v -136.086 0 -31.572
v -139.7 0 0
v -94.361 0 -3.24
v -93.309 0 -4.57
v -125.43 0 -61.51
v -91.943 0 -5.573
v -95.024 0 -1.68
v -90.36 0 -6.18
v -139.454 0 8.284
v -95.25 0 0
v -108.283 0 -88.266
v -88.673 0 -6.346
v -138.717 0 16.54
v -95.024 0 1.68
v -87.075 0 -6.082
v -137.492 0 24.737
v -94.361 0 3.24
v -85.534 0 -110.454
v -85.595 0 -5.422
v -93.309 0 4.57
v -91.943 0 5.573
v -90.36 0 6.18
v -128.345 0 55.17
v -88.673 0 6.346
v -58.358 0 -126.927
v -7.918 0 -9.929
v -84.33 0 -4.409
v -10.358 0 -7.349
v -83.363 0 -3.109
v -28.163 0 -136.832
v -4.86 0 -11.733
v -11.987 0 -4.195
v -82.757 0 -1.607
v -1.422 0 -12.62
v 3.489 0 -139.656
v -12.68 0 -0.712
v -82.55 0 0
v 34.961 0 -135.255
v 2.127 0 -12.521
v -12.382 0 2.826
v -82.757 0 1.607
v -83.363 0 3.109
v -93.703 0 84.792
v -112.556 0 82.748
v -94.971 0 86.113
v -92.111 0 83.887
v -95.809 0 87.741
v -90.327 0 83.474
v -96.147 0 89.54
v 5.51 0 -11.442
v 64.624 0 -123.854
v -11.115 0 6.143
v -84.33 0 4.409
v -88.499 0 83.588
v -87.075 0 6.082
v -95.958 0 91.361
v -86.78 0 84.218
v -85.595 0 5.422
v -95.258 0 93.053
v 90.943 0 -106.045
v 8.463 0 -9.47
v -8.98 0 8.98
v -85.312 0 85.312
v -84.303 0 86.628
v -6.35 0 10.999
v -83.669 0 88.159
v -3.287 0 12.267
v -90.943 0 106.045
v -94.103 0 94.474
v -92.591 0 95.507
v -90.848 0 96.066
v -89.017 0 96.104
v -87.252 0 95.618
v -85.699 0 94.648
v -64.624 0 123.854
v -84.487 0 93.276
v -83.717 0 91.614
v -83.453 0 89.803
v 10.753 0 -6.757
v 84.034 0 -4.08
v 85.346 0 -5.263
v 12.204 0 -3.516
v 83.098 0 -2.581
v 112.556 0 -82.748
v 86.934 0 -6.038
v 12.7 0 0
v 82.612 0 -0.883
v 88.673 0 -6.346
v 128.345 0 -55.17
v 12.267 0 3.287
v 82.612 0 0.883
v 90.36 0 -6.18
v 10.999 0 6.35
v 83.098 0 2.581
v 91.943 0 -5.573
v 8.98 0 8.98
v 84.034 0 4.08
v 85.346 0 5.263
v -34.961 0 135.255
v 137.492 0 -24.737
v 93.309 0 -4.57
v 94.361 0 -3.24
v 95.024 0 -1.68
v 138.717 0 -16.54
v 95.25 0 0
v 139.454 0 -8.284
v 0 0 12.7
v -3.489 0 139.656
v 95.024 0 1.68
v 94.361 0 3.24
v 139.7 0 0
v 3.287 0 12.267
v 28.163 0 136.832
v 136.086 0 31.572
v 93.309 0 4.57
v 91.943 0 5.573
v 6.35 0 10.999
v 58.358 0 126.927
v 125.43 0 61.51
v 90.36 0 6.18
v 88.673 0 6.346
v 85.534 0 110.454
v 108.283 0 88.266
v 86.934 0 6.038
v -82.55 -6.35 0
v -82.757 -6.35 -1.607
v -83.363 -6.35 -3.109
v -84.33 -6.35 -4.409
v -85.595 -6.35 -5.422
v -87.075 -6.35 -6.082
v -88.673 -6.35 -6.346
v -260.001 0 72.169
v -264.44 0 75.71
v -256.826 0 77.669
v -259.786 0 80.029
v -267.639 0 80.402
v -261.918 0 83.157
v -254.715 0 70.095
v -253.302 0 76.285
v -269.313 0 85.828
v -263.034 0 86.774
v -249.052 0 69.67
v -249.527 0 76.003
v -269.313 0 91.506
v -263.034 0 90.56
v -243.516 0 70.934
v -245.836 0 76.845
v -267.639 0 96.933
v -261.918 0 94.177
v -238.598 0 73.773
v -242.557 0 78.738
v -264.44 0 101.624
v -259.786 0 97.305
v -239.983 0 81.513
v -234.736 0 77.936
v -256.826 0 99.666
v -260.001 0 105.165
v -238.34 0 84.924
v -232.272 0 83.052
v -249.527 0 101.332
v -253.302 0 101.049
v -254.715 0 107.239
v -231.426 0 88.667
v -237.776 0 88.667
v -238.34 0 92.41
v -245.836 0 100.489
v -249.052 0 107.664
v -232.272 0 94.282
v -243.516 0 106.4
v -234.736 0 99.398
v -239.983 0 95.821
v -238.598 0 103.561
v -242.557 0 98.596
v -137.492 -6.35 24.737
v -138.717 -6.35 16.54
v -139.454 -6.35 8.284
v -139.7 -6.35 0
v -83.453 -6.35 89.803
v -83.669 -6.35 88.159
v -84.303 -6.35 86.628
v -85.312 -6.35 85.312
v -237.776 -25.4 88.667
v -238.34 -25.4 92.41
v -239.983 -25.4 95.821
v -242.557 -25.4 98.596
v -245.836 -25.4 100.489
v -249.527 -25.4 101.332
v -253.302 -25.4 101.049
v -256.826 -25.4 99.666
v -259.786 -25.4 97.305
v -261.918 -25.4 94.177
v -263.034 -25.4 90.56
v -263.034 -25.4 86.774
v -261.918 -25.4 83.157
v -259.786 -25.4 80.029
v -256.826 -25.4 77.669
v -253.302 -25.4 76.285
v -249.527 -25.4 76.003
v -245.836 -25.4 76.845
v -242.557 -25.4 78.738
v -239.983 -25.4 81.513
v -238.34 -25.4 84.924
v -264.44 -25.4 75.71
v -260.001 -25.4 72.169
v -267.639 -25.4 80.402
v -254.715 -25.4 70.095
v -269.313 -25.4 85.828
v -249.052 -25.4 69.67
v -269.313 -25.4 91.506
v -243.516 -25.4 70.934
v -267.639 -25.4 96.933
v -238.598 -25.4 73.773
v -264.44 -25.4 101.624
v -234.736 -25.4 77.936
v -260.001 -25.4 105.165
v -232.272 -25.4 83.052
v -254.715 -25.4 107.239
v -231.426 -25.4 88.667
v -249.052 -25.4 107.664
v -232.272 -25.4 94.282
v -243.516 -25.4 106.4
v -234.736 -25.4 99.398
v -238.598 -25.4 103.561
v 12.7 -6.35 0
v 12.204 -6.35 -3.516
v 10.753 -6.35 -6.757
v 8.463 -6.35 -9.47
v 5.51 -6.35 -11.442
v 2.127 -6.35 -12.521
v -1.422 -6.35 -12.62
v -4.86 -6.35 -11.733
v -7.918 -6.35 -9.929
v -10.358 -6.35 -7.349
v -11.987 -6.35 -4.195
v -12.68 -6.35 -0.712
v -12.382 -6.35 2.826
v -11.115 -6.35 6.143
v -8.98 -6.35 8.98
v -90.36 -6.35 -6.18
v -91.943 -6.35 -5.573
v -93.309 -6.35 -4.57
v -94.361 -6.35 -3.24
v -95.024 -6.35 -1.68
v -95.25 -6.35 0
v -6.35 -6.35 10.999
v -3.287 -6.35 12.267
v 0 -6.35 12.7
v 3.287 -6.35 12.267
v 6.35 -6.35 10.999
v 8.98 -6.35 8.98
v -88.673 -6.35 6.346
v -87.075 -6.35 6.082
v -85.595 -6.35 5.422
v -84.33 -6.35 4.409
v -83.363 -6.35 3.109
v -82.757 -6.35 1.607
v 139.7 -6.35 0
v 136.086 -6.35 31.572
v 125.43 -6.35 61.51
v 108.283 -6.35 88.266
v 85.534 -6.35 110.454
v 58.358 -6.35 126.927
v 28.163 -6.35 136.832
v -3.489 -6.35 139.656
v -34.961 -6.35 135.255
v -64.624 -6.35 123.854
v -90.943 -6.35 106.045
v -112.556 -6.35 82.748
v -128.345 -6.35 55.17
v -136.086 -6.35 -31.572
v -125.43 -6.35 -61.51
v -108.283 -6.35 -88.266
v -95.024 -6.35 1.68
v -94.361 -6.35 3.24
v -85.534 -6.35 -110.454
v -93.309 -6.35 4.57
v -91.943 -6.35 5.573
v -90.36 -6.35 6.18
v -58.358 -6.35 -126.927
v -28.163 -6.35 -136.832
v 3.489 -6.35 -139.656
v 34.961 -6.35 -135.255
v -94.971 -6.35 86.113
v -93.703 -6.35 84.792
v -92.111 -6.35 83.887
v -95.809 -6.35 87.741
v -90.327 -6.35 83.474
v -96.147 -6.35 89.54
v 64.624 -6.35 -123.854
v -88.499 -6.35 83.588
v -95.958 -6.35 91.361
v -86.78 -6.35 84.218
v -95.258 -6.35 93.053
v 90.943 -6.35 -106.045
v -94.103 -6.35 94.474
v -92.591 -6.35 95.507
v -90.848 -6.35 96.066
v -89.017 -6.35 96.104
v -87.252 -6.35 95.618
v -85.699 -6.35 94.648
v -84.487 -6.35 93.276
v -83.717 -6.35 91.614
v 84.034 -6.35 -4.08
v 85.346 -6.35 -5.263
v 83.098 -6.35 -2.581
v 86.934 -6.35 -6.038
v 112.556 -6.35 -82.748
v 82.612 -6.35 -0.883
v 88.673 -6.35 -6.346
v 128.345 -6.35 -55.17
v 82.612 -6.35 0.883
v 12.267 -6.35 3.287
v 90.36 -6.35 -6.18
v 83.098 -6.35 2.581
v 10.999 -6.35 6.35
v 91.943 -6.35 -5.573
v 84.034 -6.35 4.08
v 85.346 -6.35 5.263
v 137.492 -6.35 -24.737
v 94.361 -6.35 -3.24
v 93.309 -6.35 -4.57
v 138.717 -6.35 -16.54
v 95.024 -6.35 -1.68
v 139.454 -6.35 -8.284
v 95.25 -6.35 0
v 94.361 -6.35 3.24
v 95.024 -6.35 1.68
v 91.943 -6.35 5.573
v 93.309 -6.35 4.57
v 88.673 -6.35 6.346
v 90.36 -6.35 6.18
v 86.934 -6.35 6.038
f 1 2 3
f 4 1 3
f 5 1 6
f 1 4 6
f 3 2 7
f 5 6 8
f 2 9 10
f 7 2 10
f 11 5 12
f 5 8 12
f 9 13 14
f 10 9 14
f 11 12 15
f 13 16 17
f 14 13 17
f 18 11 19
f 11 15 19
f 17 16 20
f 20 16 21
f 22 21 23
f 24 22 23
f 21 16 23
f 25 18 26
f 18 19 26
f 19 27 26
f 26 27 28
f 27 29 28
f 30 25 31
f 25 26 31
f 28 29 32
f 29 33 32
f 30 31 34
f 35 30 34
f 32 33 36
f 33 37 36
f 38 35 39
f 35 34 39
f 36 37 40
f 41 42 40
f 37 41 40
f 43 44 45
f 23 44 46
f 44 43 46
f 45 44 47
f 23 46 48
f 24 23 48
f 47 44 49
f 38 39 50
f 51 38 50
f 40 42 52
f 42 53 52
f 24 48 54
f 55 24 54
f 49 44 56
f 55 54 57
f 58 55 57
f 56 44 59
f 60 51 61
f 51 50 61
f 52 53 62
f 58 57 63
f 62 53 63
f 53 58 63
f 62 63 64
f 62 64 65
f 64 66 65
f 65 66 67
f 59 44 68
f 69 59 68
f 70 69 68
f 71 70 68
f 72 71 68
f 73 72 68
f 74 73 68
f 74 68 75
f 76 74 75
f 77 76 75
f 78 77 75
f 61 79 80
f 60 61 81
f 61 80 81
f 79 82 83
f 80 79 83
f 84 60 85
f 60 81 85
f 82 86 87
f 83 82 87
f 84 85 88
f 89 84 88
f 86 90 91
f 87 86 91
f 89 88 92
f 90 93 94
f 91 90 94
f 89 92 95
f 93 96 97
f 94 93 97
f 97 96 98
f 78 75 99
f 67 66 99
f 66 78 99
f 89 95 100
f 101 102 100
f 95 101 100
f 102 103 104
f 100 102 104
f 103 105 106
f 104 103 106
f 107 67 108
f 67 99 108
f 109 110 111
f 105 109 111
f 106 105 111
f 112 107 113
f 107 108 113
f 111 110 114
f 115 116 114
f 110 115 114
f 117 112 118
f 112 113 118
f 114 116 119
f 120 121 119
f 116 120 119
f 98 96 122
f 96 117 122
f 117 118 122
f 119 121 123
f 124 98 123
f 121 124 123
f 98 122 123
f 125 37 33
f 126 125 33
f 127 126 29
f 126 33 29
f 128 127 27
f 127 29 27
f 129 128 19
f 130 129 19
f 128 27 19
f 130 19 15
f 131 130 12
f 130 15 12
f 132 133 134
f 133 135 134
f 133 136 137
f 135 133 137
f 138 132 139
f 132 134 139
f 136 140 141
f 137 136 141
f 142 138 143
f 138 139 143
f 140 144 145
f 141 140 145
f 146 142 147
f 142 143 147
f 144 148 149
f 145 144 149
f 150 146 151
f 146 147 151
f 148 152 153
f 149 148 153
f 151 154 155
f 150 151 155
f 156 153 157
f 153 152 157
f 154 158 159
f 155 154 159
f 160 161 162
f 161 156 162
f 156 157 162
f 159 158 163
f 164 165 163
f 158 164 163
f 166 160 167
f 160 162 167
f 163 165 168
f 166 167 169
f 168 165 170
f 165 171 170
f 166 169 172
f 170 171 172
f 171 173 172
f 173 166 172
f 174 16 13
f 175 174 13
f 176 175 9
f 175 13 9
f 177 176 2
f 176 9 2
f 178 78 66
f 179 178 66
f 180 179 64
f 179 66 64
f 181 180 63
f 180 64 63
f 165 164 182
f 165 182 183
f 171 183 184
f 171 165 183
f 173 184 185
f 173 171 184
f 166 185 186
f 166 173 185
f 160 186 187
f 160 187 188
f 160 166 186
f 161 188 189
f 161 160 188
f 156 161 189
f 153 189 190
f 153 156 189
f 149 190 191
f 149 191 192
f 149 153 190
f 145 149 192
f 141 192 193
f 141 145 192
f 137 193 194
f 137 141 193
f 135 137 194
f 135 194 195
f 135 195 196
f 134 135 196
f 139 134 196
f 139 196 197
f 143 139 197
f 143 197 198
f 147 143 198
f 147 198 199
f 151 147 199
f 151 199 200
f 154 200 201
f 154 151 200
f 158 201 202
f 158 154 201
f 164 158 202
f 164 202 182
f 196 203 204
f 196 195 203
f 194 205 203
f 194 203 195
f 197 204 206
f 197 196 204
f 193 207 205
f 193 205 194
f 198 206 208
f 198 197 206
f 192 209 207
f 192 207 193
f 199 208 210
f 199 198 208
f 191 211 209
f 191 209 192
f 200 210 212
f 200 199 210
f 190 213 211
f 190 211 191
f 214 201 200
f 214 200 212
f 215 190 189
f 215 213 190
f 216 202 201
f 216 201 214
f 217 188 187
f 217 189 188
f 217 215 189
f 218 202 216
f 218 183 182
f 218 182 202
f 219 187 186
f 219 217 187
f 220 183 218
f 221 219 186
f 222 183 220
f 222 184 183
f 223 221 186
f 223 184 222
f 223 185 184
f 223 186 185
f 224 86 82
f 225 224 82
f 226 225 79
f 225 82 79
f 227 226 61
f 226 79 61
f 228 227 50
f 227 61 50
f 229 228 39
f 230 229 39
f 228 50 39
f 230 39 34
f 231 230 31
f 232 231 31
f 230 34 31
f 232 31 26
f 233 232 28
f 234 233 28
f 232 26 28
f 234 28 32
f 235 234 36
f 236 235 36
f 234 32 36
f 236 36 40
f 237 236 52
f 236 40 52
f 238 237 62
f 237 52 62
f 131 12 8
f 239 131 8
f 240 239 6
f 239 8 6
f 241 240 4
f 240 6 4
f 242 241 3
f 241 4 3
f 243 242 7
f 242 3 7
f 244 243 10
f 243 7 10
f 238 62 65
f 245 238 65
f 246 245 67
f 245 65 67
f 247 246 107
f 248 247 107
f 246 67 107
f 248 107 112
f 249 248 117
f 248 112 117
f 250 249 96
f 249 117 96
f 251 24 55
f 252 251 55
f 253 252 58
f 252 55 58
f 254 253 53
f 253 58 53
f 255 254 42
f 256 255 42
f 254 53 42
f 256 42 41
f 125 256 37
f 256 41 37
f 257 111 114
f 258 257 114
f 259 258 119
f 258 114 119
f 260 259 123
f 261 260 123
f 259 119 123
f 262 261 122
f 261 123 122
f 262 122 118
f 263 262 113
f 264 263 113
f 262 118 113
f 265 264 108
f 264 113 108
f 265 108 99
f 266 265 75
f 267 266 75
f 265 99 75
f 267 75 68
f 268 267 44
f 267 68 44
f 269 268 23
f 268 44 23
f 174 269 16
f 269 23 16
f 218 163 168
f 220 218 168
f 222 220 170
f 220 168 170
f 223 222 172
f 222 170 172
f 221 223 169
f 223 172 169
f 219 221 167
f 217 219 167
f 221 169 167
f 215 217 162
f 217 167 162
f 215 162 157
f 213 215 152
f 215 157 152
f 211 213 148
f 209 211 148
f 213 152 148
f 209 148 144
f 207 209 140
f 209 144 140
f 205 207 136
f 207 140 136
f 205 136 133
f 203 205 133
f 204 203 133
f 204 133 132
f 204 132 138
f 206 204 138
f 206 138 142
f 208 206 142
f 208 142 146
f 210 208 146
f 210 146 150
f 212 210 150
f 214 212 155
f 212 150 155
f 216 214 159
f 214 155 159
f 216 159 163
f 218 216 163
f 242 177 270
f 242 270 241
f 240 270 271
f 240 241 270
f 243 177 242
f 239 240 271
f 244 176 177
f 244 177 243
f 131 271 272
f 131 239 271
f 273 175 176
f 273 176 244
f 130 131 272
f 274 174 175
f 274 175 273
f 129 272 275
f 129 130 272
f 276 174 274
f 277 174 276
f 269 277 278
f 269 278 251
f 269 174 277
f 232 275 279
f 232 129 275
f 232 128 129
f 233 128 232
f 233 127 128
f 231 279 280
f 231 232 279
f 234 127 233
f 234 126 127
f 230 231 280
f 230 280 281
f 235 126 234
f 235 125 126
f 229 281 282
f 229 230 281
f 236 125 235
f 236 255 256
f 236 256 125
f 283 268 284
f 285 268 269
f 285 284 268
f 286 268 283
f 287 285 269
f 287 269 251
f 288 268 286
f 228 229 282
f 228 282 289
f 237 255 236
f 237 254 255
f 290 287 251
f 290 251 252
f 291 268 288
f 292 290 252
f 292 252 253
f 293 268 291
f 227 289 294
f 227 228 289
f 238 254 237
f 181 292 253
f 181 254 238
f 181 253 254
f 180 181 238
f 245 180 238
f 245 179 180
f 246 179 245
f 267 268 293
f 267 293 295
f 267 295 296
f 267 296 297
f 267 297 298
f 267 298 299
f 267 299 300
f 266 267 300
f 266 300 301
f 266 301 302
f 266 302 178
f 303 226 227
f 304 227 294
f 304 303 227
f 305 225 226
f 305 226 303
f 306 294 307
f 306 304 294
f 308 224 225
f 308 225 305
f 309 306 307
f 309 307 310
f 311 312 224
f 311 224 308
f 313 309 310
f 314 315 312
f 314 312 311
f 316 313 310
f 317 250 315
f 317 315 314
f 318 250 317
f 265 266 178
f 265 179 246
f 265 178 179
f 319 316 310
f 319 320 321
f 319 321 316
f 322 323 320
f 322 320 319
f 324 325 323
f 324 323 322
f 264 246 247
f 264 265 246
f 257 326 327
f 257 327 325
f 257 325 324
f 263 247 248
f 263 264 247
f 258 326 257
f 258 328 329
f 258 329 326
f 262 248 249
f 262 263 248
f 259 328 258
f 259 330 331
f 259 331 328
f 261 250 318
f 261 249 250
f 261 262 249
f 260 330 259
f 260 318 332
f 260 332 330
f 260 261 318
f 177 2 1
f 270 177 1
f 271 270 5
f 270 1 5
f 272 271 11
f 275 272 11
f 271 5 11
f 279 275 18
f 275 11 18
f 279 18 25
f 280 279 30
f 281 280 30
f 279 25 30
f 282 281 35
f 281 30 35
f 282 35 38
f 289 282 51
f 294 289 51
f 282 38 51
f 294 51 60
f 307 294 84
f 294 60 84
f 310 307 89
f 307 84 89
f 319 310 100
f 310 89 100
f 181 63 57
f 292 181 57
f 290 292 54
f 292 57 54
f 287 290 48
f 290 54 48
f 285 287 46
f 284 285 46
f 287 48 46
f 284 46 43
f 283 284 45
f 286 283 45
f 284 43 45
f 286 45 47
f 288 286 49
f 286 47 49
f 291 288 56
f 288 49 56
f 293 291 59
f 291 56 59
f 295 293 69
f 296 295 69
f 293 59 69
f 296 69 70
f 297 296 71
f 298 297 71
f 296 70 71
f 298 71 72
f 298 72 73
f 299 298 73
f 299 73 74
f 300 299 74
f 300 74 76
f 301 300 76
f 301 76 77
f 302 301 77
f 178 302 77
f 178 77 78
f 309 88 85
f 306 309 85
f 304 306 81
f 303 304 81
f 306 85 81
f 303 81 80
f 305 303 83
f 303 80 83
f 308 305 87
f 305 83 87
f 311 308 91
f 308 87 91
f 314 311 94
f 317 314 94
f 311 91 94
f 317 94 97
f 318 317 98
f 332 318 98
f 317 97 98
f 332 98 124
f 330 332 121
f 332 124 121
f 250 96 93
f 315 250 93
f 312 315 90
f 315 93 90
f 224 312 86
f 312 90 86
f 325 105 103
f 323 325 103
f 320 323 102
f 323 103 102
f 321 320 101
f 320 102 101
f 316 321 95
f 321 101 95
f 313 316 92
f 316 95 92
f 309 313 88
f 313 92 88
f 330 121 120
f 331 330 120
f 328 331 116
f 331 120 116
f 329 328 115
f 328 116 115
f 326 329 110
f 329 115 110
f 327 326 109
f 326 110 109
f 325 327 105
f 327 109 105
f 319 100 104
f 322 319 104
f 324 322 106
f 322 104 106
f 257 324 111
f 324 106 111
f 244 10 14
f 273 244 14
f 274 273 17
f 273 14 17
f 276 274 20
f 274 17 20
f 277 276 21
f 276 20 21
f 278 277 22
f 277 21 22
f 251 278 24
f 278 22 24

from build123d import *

# Parameters (mm, degrees)
F2_DEPTH = 6.35
F3_R     = 19.05
F3_R_2   = 12.7
F4_DEPTH = 25.4


with BuildPart() as f2:
    # F0 (on Front) → F2 (new body)
    with BuildSketch(Plane.XZ):
        with BuildLine():
            ThreePointArc((62.8617928475, 62.8617928475), (80.8654731589, 36.9321709461), (88.6732142857, 6.3459489629))
            ThreePointArc((88.6732142857, 6.3459489629), (93.3092182252, 4.5696055238), (95.25, 0))
            Line((95.25, 0), (139.7, 0))
            ThreePointArc((139.7, 0), (12.4175773144, 139.1470221515), (-137.492466337, 24.7368490427))
            Line((-137.492466337, 24.7368490427), (-68.1350364964, 57.103649635))
            ThreePointArc((-68.1350364964, 57.103649635), (-65.5616608838, 60.0406414202), (-62.8617928475, 62.8617928475))
            Line((-62.8617928475, 62.8617928475), (-85.3124331502, 85.3124331502))
            ThreePointArc((-85.3124331502, 85.3124331502), (-95.6691962421, 92.2326010062), (-83.4525612107, 89.8025612107))
            Line((-83.4525612107, 89.8025612107), (89.8025612107, 89.8025612107))
            Line((89.8025612107, 89.8025612107), (62.8617928475, 62.8617928475))
        make_face()
        with BuildLine():
            Line((-68.1350364964, 57.103649635), (-137.492466337, 24.7368490427))
            ThreePointArc((-137.492466337, 24.7368490427), (-139.1470221515, 12.4175773144), (-139.7, 0))
            Line((-139.7, 0), (-95.25, 0))
            ThreePointArc((-95.25, 0), (-93.3092182252, 4.5696055238), (-88.6732142857, 6.3459489629))
            ThreePointArc((-88.6732142857, 6.3459489629), (-82.4093011905, 33.3454206344), (-68.1350364964, 57.103649635))
        make_face()
        with BuildLine():
            Line((137.492466337, -24.7368490427), (68.1350364964, -57.103649635))
            ThreePointArc((68.1350364964, -57.103649635), (37.5945178679, -80.5596811456), (0, -88.9))
            ThreePointArc((0, -88.9), (-60.576625596, -65.0667536565), (-88.6732142857, -6.3459489629))
            ThreePointArc((-88.6732142857, -6.3459489629), (-93.3092182252, -4.5696055238), (-95.25, 0))
            Line((-95.25, 0), (-139.7, 0))
            ThreePointArc((-139.7, 0), (-12.4175773144, -139.1470221515), (137.492466337, -24.7368490427))
        make_face()
        with BuildLine():
            ThreePointArc((88.6732142857, -6.3459489629), (82.55, 0), (88.6732142857, 6.3459489629))
            ThreePointArc((88.6732142857, 6.3459489629), (80.8654731589, 36.9321709461), (62.8617928475, 62.8617928475))
            Line((62.8617928475, 62.8617928475), (8.9802561211, 8.9802561211))
            ThreePointArc((8.9802561211, 8.9802561211), (11.7332700629, 4.860079591), (12.7, 0))
            ThreePointArc((12.7, 0), (-4.860079591, -11.7332700629), (-8.9802561211, 8.9802561211))
            Line((-8.9802561211, 8.9802561211), (-60.6136363636, 60.6136363636))
            Line((-60.6136363636, 60.6136363636), (-68.1350364964, 57.103649635))
            ThreePointArc((-68.1350364964, 57.103649635), (-82.4093011905, 33.3454206344), (-88.6732142857, 6.3459489629))
            ThreePointArc((-88.6732142857, 6.3459489629), (-84.3303944762, 4.4092182252), (-82.55, 0))
            ThreePointArc((-82.55, 0), (-84.3303944762, -4.4092182252), (-88.6732142857, -6.3459489629))
            ThreePointArc((-88.6732142857, -6.3459489629), (-60.576625596, -65.0667536565), (0, -88.9))
            Line((0, -88.9), (68.1350364964, -57.103649635))
            ThreePointArc((68.1350364964, -57.103649635), (82.4093011905, -33.3454206344), (88.6732142857, -6.3459489629))
        make_face()
        with BuildLine():
            ThreePointArc((0, 88.9), (34.0205571373, 82.1328904403), (62.8617928475, 62.8617928475))
            Line((62.8617928475, 62.8617928475), (89.8025612107, 89.8025612107))
            Line((89.8025612107, 89.8025612107), (-83.4525612107, 89.8025612107))
            ThreePointArc((-83.4525612107, 89.8025612107), (-83.9359261792, 87.3725214152), (-85.3124331502, 85.3124331502))
            Line((-85.3124331502, 85.3124331502), (-62.8617928475, 62.8617928475))
            ThreePointArc((-62.8617928475, 62.8617928475), (-34.0205571373, 82.1328904403), (0, 88.9))
        make_face()
        with BuildLine():
            ThreePointArc((95.25, 0), (93.3092182252, -4.5696055238), (88.6732142857, -6.3459489629))
            ThreePointArc((88.6732142857, -6.3459489629), (82.4093011905, -33.3454206344), (68.1350364964, -57.103649635))
            Line((68.1350364964, -57.103649635), (137.492466337, -24.7368490427))
            ThreePointArc((137.492466337, -24.7368490427), (139.1470221515, -12.4175773144), (139.7, 0))
            Line((139.7, 0), (95.25, 0))
        make_face()
        with BuildLine():
            ThreePointArc((0, -88.9), (37.5945178679, -80.5596811456), (68.1350364964, -57.103649635))
            Line((68.1350364964, -57.103649635), (0, -88.9))
        make_face()
        with BuildLine():
            Line((8.9802561211, 8.9802561211), (62.8617928475, 62.8617928475))
            ThreePointArc((62.8617928475, 62.8617928475), (34.0205571373, 82.1328904403), (0, 88.9))
            Line((0, 88.9), (-60.6136363636, 60.6136363636))
            Line((-60.6136363636, 60.6136363636), (-8.9802561211, 8.9802561211))
            ThreePointArc((-8.9802561211, 8.9802561211), (0, 12.7), (8.9802561211, 8.9802561211))
        make_face()
        with BuildLine():
            Line((-60.6136363636, 60.6136363636), (0, 88.9))
            ThreePointArc((0, 88.9), (-34.0205571373, 82.1328904403), (-62.8617928475, 62.8617928475))
            Line((-62.8617928475, 62.8617928475), (-60.6136363636, 60.6136363636))
        make_face()
        with BuildLine():
            Line((-60.6136363636, 60.6136363636), (-62.8617928475, 62.8617928475))
            ThreePointArc((-62.8617928475, 62.8617928475), (-65.5616608838, 60.0406414202), (-68.1350364964, 57.103649635))
            Line((-68.1350364964, 57.103649635), (-60.6136363636, 60.6136363636))
        make_face()
    extrude(amount=F2_DEPTH)


with BuildPart() as f4:
    # F3 (on Front) → F4 (new body)
    with BuildSketch(Plane.XZ):
        with Locations((-250.4757642746, 88.6670723557)):
            Circle(F3_R)
        with Locations((-250.4757642746, 88.6670723557)):
            Circle(F3_R_2, mode=Mode.SUBTRACT)
    extrude(amount=F4_DEPTH)


solid = Compound([f2.part, f4.part])
